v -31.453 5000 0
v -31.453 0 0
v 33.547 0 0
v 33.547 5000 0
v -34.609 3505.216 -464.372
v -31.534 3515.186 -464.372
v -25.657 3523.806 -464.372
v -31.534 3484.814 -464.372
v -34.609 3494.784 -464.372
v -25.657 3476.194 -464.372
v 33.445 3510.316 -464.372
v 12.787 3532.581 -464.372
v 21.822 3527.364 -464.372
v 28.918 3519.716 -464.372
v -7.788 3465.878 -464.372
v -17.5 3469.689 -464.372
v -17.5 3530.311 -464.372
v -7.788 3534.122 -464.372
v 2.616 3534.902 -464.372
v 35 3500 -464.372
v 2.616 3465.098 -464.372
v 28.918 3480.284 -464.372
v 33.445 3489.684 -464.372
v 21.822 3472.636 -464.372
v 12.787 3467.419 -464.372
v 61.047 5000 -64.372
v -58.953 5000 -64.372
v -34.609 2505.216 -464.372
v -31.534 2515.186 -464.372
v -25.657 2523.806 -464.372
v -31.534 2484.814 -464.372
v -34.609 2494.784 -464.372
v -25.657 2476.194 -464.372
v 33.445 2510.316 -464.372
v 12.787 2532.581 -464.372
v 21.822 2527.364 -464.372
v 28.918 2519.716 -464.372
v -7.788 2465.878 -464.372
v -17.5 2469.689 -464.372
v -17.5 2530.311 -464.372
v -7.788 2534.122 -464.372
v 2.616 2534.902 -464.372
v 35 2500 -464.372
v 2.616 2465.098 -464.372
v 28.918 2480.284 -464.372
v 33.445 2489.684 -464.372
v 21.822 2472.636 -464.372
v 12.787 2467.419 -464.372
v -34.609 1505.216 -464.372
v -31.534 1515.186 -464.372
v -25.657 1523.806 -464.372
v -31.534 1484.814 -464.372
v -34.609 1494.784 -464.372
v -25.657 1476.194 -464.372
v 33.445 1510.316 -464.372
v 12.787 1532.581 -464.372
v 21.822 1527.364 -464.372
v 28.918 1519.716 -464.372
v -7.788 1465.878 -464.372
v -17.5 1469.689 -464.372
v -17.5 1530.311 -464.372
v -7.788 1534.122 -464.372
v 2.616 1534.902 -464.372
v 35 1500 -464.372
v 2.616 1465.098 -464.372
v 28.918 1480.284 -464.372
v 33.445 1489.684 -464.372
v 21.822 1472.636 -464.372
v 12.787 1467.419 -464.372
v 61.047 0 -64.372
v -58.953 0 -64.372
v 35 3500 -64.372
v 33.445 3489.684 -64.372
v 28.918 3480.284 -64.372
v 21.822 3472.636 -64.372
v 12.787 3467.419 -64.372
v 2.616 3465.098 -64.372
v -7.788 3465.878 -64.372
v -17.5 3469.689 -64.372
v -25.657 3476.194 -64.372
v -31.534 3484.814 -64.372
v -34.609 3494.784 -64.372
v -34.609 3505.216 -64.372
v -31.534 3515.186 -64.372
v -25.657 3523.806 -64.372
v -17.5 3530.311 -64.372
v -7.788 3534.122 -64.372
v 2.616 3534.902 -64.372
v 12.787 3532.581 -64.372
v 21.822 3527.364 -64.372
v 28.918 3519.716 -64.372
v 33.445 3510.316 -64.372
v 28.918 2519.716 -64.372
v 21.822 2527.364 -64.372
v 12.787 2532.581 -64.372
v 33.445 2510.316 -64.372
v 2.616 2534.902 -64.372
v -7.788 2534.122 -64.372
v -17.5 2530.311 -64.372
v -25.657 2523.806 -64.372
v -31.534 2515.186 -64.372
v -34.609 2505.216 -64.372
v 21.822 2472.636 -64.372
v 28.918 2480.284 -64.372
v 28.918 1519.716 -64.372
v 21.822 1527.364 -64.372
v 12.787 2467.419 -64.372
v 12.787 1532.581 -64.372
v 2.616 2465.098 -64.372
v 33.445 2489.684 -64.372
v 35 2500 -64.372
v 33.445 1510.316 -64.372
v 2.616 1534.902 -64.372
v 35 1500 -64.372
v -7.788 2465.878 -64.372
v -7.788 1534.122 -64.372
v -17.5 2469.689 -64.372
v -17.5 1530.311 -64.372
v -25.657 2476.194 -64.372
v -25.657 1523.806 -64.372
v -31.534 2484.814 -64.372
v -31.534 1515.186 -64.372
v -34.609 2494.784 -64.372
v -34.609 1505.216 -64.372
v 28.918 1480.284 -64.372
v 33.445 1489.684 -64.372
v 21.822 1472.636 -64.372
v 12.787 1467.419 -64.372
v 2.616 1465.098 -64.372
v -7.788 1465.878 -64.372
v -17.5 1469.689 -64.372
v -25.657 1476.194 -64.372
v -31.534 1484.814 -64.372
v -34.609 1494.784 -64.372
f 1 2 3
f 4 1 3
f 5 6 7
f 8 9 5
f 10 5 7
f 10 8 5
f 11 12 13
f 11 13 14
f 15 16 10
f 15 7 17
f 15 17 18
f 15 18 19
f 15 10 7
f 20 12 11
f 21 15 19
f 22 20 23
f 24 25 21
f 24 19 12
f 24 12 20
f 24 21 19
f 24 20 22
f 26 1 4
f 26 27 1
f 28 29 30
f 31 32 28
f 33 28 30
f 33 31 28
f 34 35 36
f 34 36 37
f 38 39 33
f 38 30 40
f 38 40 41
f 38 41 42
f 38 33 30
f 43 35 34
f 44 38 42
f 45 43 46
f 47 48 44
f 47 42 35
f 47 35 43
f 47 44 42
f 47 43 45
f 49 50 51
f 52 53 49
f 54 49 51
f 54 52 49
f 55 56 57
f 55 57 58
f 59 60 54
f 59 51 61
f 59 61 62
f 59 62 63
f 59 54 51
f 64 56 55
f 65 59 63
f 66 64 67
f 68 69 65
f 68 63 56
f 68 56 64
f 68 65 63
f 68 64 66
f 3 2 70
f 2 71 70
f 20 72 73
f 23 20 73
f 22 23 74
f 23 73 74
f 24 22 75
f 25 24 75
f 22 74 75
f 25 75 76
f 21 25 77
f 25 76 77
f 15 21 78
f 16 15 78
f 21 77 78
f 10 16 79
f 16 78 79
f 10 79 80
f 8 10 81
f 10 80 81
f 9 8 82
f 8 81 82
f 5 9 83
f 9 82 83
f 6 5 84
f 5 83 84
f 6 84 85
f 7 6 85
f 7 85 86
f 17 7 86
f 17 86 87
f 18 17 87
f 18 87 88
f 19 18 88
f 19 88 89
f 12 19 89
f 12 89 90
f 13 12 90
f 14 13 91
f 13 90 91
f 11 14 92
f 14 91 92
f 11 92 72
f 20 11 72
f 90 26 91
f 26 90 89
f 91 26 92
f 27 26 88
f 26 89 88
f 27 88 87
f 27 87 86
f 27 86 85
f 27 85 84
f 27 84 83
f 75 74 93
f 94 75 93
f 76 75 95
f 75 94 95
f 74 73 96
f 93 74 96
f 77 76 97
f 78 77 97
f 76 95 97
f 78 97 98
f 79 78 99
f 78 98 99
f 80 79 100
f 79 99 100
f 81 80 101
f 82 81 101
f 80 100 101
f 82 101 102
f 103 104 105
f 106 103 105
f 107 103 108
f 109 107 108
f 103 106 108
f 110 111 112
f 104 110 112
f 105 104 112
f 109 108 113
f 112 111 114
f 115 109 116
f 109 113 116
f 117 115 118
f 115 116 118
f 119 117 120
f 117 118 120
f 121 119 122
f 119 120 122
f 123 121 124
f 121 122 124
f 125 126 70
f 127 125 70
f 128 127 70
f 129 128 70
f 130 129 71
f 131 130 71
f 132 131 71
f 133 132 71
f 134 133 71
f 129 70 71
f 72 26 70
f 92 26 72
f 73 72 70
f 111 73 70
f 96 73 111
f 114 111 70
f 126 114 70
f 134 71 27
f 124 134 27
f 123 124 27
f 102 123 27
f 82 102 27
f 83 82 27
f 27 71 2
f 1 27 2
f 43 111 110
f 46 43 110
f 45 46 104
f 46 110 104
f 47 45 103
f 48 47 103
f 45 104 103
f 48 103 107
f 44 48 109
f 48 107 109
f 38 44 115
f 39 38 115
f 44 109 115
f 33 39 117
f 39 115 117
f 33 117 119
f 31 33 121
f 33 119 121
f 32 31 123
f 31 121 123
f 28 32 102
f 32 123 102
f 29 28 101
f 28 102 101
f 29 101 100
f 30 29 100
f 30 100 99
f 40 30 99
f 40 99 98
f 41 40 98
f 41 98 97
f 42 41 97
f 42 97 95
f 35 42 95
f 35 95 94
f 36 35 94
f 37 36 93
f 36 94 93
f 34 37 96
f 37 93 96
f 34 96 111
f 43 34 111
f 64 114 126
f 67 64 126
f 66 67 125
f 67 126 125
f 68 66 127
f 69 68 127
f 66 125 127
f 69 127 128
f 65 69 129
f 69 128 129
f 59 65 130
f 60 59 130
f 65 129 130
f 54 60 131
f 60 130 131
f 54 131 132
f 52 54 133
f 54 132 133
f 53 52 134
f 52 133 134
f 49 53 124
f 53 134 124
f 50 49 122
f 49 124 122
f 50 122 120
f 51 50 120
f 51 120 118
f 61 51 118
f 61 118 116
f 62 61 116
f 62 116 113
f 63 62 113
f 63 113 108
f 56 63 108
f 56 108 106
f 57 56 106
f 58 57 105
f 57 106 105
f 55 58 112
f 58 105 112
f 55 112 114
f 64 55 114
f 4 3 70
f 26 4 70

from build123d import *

# Parameters (mm, degrees)
BOSS_EXTRUDE1_DEPTH = 5000
SKETCH2_R           = 35
BOSS_EXTRUDE2_DEPTH = 400
LPATTERN1_COUNT     = 3
LPATTERN1_PITCH     = 1000


with BuildPart() as part:
    # Sketch1 → Boss-Extrude1 (new body)
    with BuildSketch(Plane(origin=(0, 0, 0), x_dir=(1, 0, 0), z_dir=(0, 1, 0))):
        Polygon((-31.452576395, 0), (33.547423605, 0), (61.047423605, 64.371965948), (-58.952576395, 64.371965948), align=None)
    extrude(amount=BOSS_EXTRUDE1_DEPTH)

    # Sketch2 → Boss-Extrude2 (add)
    with BuildSketch(Plane(origin=(0, 0, -64.371965948), x_dir=(-1, 0, 0), z_dir=(0, 0, -1))):
        with Locations(Location((0, 1500, 0), (0, 0, 180))):
            Circle(SKETCH2_R)
    boss_extrude2 = extrude(amount=BOSS_EXTRUDE2_DEPTH)

    # LPattern1: Boss-Extrude2 ×3
    with Locations(*[(0, i * LPATTERN1_PITCH, 0) for i in range(1, LPATTERN1_COUNT)]):
        add(boss_extrude2)


solid = part.part
